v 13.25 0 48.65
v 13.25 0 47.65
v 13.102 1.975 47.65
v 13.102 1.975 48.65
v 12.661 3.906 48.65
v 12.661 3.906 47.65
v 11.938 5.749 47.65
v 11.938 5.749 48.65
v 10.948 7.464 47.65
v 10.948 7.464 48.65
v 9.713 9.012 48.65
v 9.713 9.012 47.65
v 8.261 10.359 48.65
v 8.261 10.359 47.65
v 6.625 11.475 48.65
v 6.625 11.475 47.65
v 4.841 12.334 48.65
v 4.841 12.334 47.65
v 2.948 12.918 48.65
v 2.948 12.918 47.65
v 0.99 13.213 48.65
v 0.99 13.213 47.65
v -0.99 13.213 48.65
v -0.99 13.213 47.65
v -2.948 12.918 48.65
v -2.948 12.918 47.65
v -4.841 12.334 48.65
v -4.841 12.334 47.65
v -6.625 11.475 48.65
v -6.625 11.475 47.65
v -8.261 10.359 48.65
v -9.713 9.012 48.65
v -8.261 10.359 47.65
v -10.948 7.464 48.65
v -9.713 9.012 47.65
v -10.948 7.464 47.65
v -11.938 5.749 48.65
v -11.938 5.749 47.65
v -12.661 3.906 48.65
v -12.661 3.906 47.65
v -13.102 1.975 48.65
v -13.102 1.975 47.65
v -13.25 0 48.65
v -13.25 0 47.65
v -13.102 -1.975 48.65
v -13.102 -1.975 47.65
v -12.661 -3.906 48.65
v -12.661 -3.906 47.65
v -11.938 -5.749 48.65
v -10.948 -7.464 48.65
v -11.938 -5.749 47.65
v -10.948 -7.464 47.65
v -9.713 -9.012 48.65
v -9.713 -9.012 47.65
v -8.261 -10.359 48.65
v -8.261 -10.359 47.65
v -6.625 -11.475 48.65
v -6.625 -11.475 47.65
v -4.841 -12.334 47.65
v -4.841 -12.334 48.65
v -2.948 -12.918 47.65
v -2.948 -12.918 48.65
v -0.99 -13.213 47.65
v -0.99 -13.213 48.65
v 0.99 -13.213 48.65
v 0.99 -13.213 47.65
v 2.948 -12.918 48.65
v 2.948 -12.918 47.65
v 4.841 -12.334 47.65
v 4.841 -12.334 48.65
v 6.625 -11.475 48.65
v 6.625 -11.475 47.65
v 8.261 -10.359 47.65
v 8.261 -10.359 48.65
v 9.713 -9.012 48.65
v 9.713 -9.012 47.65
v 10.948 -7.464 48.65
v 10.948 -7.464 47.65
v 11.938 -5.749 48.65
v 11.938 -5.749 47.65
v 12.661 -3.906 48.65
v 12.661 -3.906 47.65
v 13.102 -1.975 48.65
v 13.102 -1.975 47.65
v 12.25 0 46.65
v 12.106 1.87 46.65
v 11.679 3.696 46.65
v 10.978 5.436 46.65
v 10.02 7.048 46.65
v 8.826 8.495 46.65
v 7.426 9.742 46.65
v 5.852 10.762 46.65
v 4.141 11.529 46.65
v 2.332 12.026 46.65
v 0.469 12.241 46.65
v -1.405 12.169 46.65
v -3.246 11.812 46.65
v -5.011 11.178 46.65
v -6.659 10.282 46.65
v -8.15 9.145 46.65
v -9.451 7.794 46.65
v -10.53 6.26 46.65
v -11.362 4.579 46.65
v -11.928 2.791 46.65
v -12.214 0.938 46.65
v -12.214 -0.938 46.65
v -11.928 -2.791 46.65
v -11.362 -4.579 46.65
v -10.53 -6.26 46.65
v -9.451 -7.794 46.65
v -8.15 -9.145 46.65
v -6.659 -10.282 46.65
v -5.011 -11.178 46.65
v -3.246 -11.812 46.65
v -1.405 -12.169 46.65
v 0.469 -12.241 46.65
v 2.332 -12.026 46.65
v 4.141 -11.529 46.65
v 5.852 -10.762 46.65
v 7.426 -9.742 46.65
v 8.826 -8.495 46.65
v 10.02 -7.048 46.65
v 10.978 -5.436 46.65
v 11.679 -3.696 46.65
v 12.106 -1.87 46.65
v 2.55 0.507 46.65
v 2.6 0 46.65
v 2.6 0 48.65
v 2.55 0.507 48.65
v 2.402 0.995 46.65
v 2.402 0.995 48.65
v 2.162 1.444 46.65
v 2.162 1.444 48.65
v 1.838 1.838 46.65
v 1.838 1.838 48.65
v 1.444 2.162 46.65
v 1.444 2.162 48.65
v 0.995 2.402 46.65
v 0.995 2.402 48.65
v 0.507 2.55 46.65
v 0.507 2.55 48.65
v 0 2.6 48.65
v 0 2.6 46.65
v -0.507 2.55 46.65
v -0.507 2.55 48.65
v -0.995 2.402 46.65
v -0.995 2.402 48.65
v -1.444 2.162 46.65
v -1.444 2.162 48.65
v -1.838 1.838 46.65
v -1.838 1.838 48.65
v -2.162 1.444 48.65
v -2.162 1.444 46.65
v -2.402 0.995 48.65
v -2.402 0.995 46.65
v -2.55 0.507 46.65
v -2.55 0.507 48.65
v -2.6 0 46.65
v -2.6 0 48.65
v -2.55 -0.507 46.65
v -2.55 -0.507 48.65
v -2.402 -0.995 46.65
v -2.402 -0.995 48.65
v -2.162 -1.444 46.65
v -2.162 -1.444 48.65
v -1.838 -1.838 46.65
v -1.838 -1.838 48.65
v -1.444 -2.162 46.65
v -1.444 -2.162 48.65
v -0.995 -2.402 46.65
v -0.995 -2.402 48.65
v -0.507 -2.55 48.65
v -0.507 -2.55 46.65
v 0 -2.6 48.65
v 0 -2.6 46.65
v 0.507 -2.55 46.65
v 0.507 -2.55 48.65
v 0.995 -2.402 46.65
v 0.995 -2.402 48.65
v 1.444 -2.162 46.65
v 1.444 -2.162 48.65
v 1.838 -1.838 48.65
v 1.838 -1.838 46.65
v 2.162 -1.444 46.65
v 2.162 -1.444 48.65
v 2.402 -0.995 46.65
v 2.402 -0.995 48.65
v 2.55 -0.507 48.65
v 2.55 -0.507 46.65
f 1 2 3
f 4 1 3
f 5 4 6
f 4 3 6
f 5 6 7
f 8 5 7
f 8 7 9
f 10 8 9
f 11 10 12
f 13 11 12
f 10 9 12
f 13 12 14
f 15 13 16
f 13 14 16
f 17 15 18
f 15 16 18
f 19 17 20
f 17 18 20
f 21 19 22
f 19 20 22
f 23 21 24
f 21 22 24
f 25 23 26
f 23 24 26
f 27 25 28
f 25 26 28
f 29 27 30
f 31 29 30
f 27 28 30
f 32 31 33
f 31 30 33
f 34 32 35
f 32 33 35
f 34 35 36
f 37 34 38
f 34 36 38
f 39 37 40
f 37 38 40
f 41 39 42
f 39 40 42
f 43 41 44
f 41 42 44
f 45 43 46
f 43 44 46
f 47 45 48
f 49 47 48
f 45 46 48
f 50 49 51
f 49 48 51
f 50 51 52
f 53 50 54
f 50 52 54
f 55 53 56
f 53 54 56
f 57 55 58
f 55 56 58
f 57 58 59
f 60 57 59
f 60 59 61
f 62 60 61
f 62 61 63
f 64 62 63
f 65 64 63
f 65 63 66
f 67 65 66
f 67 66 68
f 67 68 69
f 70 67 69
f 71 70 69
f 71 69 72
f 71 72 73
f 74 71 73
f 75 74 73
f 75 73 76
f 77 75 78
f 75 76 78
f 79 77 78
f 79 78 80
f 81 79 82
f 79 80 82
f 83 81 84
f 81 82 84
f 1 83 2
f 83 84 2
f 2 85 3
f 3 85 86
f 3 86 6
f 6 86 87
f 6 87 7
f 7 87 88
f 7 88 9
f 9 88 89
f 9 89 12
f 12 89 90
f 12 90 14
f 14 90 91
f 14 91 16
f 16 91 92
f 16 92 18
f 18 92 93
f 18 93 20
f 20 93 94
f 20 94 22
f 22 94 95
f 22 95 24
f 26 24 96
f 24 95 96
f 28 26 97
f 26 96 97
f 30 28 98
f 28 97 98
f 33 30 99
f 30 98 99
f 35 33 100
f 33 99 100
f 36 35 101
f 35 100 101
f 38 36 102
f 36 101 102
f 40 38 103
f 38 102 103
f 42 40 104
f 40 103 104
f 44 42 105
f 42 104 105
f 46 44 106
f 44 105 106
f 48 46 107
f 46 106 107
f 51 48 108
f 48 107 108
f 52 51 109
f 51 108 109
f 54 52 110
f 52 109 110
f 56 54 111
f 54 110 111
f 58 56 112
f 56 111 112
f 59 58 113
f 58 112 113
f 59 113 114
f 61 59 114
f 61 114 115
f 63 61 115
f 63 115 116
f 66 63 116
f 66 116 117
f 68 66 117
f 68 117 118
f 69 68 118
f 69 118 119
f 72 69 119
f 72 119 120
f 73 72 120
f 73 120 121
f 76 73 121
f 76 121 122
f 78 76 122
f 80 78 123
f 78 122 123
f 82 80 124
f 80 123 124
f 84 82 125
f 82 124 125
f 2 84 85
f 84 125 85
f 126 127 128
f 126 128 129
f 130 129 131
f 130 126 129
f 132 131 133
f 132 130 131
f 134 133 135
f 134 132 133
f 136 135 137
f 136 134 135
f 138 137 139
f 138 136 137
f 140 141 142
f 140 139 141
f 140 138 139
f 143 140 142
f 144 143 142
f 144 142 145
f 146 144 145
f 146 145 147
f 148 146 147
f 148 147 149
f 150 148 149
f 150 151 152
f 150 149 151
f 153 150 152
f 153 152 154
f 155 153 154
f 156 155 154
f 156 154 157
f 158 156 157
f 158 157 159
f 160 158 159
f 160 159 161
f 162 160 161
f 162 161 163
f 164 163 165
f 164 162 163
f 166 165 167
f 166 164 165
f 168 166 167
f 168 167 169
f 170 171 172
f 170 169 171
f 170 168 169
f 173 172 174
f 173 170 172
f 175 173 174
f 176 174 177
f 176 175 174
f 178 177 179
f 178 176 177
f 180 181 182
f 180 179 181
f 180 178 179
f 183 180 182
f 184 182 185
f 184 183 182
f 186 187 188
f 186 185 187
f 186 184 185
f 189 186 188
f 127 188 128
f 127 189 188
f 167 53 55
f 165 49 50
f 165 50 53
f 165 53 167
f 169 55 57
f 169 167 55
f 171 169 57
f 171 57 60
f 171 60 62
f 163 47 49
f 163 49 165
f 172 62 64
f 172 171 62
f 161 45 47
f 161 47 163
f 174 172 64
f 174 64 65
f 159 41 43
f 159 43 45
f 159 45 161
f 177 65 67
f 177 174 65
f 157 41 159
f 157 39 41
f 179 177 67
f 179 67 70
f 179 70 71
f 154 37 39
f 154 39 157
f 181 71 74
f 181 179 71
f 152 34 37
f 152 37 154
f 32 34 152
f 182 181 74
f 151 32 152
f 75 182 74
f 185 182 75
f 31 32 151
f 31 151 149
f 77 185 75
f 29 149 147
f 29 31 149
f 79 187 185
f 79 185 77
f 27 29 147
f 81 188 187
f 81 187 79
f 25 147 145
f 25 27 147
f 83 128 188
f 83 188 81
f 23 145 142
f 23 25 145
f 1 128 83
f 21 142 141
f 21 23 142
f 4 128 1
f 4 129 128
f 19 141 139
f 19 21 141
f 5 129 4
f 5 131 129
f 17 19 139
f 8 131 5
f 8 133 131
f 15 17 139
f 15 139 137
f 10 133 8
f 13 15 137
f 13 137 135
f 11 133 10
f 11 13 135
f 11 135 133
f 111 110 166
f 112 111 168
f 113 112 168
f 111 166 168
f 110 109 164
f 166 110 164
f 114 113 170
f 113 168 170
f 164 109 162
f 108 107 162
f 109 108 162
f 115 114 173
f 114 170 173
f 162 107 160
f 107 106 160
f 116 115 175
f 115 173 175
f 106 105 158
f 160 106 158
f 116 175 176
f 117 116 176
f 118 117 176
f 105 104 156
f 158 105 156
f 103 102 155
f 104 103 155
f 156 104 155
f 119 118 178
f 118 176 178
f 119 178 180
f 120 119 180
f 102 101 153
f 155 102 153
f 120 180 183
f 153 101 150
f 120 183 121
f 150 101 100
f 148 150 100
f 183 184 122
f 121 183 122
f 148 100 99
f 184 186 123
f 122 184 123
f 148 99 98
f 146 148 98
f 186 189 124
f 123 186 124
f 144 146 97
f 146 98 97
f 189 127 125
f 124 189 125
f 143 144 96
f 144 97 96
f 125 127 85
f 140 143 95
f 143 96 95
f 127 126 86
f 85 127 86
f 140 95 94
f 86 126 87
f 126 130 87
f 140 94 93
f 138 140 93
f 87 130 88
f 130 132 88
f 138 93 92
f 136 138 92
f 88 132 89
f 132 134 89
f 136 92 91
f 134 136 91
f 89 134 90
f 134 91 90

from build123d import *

# Parameters (mm, degrees)
CYLINDER1981_R     = 2.6
CYLINDER1981_DEPTH = 33
CYLINDER1980_R     = 13.25
CYLINDER1980_DEPTH = 2
CHAMFER100_SIZE    = 1


with BuildPart() as v_lec1981:
    # Cylinder1981 → Cylinder1981 (new body)
    with BuildSketch(Plane.XY.offset(42)):
        Circle(CYLINDER1981_R)
    extrude(amount=CYLINDER1981_DEPTH)


with BuildPart() as chamfer100:
    # Cylinder1980 → Cylinder1980 (new body)
    with BuildSketch(Plane.XY.offset(46.65)):
        Circle(CYLINDER1980_R)
    extrude(amount=CYLINDER1980_DEPTH)

    # Cut740: cut Válec1981
    add(v_lec1981.part, mode=Mode.SUBTRACT)

    # Chamfer100
    chamfer100_edges = [chamfer100.edges().sort_by_distance(p)[0] for p in [
        (-13.25, 0, 46.65),
    ]]
    chamfer(chamfer100_edges, length=CHAMFER100_SIZE)


solid = chamfer100.part
